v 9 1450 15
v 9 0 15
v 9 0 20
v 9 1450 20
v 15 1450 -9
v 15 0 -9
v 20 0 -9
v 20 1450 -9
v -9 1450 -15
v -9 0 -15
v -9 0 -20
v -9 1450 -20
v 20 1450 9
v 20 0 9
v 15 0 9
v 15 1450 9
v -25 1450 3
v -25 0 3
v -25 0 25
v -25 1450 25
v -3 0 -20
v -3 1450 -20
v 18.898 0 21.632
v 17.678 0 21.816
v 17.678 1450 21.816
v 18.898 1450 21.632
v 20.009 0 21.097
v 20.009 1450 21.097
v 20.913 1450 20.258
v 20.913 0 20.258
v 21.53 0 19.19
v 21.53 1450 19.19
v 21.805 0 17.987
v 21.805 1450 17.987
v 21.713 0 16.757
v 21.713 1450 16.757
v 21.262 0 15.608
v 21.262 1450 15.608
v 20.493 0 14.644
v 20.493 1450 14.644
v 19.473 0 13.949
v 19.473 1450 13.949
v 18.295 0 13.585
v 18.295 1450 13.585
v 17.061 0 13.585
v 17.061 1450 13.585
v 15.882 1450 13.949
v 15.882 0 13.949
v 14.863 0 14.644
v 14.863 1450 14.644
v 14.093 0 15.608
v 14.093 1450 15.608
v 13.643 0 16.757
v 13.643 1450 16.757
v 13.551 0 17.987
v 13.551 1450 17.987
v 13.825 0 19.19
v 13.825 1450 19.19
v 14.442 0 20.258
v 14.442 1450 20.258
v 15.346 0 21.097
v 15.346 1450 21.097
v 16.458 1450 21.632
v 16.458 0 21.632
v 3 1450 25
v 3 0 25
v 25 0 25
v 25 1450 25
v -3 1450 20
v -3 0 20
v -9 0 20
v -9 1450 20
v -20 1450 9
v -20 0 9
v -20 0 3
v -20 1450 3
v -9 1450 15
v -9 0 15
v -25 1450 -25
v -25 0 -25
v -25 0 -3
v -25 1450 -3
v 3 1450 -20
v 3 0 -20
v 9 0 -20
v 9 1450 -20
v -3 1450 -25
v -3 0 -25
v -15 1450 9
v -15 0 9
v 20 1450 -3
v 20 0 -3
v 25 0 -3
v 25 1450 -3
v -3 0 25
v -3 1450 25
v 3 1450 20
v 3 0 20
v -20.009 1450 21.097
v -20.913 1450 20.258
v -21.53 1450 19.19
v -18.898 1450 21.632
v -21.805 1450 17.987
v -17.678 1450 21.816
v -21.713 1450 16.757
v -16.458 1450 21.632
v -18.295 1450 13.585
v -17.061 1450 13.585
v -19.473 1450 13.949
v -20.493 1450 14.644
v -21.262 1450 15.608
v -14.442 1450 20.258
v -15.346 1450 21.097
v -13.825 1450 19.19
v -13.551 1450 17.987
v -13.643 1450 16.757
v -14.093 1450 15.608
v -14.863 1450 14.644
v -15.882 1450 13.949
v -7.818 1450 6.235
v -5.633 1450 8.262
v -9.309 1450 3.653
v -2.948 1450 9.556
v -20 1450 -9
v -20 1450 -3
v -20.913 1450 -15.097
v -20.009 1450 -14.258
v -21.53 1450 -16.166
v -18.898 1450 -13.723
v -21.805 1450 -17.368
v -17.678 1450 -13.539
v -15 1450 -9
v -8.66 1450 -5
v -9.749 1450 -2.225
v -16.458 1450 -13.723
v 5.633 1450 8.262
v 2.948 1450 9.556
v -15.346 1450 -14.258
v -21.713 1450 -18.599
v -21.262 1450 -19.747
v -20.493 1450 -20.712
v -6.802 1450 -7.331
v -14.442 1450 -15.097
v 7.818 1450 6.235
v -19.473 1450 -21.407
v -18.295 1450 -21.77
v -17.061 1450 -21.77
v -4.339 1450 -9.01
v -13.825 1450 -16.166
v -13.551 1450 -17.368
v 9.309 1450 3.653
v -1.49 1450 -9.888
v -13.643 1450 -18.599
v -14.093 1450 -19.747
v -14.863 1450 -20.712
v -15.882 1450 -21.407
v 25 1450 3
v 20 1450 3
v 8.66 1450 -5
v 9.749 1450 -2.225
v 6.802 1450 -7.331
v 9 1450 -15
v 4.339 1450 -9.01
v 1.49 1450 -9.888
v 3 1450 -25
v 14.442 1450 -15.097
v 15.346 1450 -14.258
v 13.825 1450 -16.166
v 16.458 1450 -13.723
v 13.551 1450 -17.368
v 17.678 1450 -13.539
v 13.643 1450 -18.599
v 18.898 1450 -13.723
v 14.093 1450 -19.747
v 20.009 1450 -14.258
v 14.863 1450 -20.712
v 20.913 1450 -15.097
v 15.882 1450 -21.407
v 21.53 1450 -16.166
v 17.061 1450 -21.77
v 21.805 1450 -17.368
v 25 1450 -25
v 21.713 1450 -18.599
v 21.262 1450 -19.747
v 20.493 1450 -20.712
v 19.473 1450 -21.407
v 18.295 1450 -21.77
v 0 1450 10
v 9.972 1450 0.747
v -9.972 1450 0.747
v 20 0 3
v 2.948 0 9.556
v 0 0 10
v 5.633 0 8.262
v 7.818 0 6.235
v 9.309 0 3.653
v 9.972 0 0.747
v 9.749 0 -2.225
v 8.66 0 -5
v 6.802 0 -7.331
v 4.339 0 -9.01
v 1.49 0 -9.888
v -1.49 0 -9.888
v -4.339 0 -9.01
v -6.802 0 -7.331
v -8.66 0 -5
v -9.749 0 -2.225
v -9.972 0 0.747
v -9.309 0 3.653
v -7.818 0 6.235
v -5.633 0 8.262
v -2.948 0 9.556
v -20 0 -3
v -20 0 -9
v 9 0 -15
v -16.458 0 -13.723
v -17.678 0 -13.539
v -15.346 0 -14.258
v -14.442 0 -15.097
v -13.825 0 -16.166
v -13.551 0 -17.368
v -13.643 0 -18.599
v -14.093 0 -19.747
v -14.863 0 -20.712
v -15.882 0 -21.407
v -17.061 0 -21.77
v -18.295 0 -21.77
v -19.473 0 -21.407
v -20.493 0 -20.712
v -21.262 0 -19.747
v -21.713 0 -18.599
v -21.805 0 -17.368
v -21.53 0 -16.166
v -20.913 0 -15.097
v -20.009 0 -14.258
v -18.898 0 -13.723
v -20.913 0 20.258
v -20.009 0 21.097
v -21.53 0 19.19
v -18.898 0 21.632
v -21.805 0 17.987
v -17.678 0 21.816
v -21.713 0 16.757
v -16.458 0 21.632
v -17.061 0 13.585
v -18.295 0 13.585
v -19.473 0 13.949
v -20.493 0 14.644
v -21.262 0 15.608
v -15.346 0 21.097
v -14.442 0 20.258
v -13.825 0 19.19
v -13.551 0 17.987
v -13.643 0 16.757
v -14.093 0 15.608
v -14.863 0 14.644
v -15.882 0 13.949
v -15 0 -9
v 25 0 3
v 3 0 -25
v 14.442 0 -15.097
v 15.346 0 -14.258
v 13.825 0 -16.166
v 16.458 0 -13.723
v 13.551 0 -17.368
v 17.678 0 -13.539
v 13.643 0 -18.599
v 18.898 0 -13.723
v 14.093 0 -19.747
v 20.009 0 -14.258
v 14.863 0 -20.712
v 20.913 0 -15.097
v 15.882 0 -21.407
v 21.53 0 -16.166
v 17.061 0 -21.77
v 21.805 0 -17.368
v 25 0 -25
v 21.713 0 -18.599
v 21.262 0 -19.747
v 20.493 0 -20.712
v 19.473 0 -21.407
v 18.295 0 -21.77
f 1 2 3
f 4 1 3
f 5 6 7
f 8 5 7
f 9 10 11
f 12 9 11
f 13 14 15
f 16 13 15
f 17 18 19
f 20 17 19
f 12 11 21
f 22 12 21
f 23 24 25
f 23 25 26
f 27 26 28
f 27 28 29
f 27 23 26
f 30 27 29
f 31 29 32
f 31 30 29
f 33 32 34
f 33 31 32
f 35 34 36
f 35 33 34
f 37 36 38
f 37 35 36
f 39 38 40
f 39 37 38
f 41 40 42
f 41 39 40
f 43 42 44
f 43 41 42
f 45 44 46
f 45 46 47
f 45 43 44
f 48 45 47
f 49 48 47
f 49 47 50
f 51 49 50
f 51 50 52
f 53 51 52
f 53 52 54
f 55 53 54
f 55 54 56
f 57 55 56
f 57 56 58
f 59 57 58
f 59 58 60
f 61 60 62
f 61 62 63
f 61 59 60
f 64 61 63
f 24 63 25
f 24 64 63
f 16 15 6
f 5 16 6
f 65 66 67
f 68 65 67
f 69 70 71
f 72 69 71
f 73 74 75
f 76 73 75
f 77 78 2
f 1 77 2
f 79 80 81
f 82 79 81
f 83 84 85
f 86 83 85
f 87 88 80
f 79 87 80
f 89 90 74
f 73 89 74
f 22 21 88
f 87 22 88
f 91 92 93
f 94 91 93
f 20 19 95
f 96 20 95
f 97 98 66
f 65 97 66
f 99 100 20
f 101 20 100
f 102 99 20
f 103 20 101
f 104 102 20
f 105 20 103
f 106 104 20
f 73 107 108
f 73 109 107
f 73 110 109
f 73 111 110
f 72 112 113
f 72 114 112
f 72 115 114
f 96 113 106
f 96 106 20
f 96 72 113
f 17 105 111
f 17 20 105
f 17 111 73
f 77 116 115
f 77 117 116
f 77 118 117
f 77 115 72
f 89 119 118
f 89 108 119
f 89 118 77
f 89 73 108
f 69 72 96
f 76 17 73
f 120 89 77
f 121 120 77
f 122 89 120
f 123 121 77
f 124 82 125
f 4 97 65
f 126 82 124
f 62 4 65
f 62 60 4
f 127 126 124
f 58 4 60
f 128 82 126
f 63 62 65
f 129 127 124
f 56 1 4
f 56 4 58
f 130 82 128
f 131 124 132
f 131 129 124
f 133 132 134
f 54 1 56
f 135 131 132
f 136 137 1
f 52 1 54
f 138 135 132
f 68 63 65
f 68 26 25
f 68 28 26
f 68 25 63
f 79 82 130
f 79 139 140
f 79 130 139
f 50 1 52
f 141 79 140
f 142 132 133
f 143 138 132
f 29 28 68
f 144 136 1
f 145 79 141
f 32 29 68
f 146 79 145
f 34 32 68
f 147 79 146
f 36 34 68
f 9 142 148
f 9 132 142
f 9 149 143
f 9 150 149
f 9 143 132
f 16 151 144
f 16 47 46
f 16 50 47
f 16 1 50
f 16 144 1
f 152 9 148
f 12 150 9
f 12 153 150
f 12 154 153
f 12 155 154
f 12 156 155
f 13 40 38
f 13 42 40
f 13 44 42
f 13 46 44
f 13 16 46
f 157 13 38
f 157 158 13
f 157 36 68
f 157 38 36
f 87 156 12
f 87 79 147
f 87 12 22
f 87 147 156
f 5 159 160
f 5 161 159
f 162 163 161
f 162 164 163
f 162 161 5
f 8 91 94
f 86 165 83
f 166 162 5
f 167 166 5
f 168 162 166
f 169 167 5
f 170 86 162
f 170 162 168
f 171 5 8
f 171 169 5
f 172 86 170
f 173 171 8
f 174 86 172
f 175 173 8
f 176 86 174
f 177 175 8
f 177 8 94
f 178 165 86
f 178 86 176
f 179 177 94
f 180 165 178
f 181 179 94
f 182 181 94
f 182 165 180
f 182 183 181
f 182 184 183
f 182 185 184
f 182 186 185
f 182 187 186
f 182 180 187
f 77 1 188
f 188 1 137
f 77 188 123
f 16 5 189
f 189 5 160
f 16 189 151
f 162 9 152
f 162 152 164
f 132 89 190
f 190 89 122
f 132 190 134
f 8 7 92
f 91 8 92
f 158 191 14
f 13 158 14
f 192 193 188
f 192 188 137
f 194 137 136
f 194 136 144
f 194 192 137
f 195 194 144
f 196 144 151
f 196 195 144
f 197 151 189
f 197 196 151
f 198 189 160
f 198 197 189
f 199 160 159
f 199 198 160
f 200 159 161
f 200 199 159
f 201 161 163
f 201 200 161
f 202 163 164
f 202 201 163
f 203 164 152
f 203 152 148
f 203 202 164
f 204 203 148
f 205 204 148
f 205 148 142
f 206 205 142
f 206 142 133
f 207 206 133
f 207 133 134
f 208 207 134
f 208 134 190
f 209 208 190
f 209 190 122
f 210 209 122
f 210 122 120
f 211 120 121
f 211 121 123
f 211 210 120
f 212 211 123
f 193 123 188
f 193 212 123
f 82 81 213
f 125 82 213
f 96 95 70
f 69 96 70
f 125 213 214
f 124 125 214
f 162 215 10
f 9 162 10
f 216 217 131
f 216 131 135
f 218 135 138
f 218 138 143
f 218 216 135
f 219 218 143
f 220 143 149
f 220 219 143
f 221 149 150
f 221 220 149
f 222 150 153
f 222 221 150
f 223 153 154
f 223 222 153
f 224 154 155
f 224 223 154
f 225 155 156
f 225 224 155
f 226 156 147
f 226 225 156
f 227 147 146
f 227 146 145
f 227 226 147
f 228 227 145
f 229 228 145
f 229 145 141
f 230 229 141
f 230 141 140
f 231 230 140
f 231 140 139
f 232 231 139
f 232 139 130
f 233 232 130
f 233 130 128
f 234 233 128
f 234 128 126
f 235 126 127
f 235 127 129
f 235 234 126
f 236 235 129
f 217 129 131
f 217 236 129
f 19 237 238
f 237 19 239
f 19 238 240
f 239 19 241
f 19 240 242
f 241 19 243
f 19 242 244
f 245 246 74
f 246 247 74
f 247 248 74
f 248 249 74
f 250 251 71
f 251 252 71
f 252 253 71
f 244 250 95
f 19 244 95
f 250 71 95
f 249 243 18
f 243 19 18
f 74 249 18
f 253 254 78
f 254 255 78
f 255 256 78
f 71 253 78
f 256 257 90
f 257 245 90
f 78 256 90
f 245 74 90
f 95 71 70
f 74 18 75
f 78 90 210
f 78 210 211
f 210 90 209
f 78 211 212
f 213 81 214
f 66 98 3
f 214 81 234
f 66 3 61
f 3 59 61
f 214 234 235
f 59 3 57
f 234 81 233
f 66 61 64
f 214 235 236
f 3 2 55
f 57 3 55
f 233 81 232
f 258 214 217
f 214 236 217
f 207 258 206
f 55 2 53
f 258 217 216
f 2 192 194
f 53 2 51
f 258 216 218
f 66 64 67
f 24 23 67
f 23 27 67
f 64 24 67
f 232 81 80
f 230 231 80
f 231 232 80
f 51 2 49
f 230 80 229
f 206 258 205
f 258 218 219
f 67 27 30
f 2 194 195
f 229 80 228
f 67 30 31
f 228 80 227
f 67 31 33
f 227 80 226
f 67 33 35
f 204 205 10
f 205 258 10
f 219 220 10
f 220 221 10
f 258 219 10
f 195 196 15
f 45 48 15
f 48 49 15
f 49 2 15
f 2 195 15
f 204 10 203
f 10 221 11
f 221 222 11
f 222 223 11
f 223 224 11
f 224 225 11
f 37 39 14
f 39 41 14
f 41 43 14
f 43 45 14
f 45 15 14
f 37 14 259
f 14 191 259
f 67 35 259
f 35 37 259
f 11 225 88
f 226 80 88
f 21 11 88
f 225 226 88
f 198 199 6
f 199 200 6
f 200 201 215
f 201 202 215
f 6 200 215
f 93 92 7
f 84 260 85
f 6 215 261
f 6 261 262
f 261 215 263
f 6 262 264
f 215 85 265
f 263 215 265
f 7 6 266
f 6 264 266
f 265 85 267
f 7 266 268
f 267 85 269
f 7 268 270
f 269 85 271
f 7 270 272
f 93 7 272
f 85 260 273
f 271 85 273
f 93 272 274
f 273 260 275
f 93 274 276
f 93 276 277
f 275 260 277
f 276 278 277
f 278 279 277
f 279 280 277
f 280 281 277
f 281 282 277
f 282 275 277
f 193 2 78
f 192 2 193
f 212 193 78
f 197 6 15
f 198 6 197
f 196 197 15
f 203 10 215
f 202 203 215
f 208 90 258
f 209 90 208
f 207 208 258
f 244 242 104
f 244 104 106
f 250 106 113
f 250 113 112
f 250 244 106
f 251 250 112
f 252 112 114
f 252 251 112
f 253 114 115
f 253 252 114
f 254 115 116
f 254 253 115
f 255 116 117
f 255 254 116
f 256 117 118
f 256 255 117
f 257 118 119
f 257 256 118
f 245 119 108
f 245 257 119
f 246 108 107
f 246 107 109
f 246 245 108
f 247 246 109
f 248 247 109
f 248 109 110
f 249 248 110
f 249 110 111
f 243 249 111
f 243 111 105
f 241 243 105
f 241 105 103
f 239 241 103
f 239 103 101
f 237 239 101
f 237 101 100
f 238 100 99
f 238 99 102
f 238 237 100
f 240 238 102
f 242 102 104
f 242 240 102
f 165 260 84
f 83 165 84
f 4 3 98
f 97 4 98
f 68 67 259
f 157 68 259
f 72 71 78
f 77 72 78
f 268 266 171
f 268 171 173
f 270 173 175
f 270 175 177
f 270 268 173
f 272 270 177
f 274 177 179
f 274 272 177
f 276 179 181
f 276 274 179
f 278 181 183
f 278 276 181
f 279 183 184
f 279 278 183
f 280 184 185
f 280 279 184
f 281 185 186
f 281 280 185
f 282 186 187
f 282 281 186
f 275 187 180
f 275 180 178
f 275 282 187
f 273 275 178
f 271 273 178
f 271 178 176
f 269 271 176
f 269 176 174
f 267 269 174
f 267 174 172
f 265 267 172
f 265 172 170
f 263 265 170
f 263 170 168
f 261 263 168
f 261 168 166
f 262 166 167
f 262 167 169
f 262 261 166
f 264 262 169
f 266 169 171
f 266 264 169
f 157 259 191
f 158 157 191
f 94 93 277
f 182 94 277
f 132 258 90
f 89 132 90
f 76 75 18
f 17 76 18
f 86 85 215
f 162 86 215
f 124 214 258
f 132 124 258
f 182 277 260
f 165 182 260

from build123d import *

# Parameters (mm, degrees)
SKETCH1_R           = 10
SKETCH1_R_2         = 4.138691164
BOSS_EXTRUDE1_DEPTH = 1450


with BuildPart() as part:
    # Sketch1 → Boss-Extrude1 (new body)
    with BuildSketch(Plane(origin=(0, 0, 0), x_dir=(1, 0, 0), z_dir=(0, 1, 0))):
        Polygon((-25, -3), (-25, -25), (-3, -25), (-3, -20), (-9, -20), (-9, -15), (9, -15), (9, -20), (3, -20), (3, -25), (25, -25), (25, -3), (20, -3), (20, -9), (15, -9), (15, 9), (20, 9), (20, 3), (25, 3), (25, 25), (3, 25), (3, 20), (9, 20), (9, 15), (-9, 15), (-9, 20), (-3, 20), (-3, 25), (-25, 25), (-25, 3), (-20, 3), (-20, 9), (-15, 9), (-15, -9), (-20, -9), (-20, -3), align=None)
        with Locations(Location((0, 0, 0), (0, 0, 270))):
            Circle(SKETCH1_R, mode=Mode.SUBTRACT)
        with Locations(Location((-17.67766953, 17.67766953, 0), (0, 0, 270))):
            Circle(SKETCH1_R_2, mode=Mode.SUBTRACT)
        with Locations(Location((17.67766953, 17.67766953, 0), (0, 0, 270))):
            Circle(SKETCH1_R_2, mode=Mode.SUBTRACT)
        with Locations(Location((17.67766953, -17.67766953, 0), (0, 0, 270))):
            Circle(SKETCH1_R_2, mode=Mode.SUBTRACT)
        with Locations(Location((-17.67766953, -17.67766953, 0), (0, 0, 270))):
            Circle(SKETCH1_R_2, mode=Mode.SUBTRACT)
    extrude(amount=BOSS_EXTRUDE1_DEPTH)


solid = part.part
